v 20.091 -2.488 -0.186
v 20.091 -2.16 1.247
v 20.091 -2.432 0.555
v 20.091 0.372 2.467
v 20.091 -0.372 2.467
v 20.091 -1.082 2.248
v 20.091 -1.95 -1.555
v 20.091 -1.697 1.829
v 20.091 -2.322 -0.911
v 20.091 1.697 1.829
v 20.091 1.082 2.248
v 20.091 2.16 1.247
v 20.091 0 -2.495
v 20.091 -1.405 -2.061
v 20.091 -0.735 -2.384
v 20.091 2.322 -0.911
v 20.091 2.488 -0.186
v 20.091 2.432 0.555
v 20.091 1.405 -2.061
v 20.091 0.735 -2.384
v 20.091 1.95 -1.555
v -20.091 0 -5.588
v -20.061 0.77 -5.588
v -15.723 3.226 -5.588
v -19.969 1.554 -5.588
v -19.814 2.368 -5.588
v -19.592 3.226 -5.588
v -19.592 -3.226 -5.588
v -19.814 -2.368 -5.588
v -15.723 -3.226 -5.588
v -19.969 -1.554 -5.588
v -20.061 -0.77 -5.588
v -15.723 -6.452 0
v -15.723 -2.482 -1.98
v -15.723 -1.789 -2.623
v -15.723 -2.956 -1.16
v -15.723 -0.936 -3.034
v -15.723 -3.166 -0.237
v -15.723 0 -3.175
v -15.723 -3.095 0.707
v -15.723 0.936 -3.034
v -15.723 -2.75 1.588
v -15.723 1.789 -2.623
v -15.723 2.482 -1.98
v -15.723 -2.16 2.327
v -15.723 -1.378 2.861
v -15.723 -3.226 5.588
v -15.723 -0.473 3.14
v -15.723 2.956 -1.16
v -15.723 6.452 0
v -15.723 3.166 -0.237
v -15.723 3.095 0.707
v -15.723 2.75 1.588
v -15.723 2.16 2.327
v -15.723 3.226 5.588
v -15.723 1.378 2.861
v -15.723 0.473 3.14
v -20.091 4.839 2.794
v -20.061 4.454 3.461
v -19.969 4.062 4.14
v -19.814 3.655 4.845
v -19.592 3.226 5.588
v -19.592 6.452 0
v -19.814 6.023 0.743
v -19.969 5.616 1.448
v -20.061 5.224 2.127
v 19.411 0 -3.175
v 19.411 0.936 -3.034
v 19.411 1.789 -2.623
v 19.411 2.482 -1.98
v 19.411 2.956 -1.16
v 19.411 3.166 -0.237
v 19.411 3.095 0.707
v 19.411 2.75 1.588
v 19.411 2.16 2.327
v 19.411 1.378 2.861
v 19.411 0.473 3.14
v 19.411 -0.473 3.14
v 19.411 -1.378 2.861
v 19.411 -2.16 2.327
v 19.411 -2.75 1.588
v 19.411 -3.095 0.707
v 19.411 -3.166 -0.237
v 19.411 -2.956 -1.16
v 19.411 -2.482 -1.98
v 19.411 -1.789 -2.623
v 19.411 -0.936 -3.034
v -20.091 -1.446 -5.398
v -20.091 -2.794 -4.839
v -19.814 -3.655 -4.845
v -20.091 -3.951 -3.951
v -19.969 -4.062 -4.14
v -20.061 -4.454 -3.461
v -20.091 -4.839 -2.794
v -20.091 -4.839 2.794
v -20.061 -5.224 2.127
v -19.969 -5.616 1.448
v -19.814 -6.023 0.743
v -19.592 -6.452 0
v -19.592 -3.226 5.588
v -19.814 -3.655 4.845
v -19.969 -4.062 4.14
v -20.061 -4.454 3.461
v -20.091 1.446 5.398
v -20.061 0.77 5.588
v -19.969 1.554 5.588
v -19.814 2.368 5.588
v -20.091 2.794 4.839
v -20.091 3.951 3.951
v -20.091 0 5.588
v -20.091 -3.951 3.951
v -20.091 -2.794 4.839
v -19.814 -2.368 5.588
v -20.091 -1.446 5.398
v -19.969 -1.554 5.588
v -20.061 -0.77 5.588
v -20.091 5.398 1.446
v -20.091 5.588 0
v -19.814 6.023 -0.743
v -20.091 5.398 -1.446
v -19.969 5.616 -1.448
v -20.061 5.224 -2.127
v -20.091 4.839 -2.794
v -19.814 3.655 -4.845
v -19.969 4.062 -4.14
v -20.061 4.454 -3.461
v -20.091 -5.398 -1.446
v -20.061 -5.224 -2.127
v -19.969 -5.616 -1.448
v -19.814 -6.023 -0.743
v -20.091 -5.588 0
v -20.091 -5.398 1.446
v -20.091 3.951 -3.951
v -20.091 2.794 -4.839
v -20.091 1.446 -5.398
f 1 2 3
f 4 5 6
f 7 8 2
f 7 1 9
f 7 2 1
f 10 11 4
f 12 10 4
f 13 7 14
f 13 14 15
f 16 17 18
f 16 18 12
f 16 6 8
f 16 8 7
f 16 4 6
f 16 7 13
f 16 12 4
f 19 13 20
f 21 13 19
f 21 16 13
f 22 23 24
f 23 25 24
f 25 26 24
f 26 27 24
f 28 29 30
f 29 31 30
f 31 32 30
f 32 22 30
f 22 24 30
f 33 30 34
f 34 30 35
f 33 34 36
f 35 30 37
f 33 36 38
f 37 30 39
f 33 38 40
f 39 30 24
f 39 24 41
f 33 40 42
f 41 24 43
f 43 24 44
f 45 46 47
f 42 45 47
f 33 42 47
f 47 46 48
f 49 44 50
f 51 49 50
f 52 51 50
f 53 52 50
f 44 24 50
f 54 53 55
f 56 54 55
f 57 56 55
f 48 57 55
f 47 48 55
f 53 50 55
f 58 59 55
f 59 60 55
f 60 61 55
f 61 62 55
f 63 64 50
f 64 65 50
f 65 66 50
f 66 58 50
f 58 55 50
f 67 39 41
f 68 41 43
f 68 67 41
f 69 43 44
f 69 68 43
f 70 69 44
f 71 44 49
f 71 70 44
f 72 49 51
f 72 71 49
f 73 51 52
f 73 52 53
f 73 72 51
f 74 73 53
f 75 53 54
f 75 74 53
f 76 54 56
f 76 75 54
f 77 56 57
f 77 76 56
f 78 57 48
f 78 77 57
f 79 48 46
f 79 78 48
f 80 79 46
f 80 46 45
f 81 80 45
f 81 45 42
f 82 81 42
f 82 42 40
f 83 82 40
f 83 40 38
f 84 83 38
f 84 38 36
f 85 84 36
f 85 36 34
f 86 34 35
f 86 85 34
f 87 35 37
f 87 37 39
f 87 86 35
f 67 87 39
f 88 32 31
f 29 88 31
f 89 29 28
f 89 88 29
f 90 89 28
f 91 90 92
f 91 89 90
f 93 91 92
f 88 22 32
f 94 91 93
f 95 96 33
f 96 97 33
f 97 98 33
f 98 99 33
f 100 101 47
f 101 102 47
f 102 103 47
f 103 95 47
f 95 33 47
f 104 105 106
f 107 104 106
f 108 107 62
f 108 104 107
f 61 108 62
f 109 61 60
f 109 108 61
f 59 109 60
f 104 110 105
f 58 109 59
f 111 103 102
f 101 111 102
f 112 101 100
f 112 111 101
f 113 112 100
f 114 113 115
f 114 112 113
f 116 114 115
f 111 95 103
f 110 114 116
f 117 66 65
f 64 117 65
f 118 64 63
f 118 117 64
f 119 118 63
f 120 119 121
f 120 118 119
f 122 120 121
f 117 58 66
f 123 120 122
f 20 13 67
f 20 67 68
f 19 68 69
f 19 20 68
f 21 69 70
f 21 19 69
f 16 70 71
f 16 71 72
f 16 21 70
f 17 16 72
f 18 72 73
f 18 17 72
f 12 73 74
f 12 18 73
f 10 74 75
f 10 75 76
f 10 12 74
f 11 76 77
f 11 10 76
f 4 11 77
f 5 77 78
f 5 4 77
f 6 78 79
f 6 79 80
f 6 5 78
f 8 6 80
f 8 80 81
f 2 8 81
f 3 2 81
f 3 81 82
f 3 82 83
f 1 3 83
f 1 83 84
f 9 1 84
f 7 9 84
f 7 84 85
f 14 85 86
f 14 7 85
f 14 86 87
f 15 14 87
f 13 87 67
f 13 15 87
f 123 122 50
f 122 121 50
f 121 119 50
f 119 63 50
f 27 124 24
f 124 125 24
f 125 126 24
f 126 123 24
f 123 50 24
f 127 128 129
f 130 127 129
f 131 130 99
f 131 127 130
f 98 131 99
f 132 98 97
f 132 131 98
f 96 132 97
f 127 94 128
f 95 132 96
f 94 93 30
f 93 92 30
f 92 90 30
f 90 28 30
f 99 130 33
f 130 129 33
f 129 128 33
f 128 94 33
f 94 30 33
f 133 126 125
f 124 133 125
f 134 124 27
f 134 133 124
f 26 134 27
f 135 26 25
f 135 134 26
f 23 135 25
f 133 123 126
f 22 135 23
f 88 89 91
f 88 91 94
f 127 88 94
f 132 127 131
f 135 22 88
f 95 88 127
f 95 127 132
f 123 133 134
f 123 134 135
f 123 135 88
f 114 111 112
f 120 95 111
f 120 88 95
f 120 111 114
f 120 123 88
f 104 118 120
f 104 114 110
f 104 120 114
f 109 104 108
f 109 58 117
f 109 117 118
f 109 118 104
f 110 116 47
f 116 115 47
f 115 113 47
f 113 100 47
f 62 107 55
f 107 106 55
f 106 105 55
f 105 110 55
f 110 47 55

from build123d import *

# Parameters (mm, degrees)
SKETCH5_R           = 3.175
BOSS_EXTRUDE3_DEPTH = 35.814
CHAMFER1_SIZE       = 0.680357143
BOSS_EXTRUDE4_DEPTH = 4.3688
SKETCH8_OUTSIDE_W   = 167.676
SKETCH8_OUTSIDE_H   = 169.404
SKETCH8_OUTSIDE_R   = 5.588
CUT_EXTRUDE3_DEPTH  = 42.079404635
CUT_EXTRUDE3_DRAFT  = -60


with BuildPart() as part:
    # Sketch5 → Boss-Extrude3 (new body)
    with BuildSketch(Plane(origin=(20.0914, 0, 0), x_dir=(0, 0, -1), z_dir=(1, 0, 0))):
        Circle(SKETCH5_R)
    extrude(amount=-BOSS_EXTRUDE3_DEPTH)

    # Chamfer1
    chamfer1_edges = [part.edges().sort_by_distance(p)[0] for p in [
        (20.0914, 0, 3.175),
    ]]
    chamfer(chamfer1_edges, length=CHAMFER1_SIZE)

    # Sketch6 → Boss-Extrude4 (add)
    with BuildSketch(Plane.ZY.offset(15.7226)):
        Polygon((5.588, 3.226233304), (0, 6.452466608), (-5.588, 3.226233304), (-5.588, -3.226233304), (0, -6.452466608), (5.588, -3.226233304), align=None)
    extrude(amount=BOSS_EXTRUDE4_DEPTH)


with BuildPart() as cut_extrude3_tool:
    # Sketch8 outside → Cut-Extrude3 (with draft: the straight prism first)
    with BuildSketch(Plane.ZY.offset(20.0914)):
        Rectangle(SKETCH8_OUTSIDE_W, SKETCH8_OUTSIDE_H)
        Circle(SKETCH8_OUTSIDE_R, mode=Mode.SUBTRACT)
    extrude(amount=-CUT_EXTRUDE3_DEPTH)
    # Cut-Extrude3: the draft: its side faces are tilted about the plane it starts from
    cut_extrude3_sides = [cut_extrude3_tool.faces().sort_by_distance(p)[0] for p in [
        (0.948302318, -84.702, 0),
        (0.948302318, 0, 83.838),
        (0.948302318, 84.702, 0),
        (0.948302318, 0, -83.838),
        (0.948302318, 0, -5.588),
    ]]
    draft(cut_extrude3_sides, Plane.ZY.offset(20.0914), CUT_EXTRUDE3_DRAFT)


with BuildPart() as part_1:
    add(part.part)

    # Cut-Extrude3: cut by cut_extrude3_tool
    add(cut_extrude3_tool.part, mode=Mode.SUBTRACT)


solid = part_1.part
